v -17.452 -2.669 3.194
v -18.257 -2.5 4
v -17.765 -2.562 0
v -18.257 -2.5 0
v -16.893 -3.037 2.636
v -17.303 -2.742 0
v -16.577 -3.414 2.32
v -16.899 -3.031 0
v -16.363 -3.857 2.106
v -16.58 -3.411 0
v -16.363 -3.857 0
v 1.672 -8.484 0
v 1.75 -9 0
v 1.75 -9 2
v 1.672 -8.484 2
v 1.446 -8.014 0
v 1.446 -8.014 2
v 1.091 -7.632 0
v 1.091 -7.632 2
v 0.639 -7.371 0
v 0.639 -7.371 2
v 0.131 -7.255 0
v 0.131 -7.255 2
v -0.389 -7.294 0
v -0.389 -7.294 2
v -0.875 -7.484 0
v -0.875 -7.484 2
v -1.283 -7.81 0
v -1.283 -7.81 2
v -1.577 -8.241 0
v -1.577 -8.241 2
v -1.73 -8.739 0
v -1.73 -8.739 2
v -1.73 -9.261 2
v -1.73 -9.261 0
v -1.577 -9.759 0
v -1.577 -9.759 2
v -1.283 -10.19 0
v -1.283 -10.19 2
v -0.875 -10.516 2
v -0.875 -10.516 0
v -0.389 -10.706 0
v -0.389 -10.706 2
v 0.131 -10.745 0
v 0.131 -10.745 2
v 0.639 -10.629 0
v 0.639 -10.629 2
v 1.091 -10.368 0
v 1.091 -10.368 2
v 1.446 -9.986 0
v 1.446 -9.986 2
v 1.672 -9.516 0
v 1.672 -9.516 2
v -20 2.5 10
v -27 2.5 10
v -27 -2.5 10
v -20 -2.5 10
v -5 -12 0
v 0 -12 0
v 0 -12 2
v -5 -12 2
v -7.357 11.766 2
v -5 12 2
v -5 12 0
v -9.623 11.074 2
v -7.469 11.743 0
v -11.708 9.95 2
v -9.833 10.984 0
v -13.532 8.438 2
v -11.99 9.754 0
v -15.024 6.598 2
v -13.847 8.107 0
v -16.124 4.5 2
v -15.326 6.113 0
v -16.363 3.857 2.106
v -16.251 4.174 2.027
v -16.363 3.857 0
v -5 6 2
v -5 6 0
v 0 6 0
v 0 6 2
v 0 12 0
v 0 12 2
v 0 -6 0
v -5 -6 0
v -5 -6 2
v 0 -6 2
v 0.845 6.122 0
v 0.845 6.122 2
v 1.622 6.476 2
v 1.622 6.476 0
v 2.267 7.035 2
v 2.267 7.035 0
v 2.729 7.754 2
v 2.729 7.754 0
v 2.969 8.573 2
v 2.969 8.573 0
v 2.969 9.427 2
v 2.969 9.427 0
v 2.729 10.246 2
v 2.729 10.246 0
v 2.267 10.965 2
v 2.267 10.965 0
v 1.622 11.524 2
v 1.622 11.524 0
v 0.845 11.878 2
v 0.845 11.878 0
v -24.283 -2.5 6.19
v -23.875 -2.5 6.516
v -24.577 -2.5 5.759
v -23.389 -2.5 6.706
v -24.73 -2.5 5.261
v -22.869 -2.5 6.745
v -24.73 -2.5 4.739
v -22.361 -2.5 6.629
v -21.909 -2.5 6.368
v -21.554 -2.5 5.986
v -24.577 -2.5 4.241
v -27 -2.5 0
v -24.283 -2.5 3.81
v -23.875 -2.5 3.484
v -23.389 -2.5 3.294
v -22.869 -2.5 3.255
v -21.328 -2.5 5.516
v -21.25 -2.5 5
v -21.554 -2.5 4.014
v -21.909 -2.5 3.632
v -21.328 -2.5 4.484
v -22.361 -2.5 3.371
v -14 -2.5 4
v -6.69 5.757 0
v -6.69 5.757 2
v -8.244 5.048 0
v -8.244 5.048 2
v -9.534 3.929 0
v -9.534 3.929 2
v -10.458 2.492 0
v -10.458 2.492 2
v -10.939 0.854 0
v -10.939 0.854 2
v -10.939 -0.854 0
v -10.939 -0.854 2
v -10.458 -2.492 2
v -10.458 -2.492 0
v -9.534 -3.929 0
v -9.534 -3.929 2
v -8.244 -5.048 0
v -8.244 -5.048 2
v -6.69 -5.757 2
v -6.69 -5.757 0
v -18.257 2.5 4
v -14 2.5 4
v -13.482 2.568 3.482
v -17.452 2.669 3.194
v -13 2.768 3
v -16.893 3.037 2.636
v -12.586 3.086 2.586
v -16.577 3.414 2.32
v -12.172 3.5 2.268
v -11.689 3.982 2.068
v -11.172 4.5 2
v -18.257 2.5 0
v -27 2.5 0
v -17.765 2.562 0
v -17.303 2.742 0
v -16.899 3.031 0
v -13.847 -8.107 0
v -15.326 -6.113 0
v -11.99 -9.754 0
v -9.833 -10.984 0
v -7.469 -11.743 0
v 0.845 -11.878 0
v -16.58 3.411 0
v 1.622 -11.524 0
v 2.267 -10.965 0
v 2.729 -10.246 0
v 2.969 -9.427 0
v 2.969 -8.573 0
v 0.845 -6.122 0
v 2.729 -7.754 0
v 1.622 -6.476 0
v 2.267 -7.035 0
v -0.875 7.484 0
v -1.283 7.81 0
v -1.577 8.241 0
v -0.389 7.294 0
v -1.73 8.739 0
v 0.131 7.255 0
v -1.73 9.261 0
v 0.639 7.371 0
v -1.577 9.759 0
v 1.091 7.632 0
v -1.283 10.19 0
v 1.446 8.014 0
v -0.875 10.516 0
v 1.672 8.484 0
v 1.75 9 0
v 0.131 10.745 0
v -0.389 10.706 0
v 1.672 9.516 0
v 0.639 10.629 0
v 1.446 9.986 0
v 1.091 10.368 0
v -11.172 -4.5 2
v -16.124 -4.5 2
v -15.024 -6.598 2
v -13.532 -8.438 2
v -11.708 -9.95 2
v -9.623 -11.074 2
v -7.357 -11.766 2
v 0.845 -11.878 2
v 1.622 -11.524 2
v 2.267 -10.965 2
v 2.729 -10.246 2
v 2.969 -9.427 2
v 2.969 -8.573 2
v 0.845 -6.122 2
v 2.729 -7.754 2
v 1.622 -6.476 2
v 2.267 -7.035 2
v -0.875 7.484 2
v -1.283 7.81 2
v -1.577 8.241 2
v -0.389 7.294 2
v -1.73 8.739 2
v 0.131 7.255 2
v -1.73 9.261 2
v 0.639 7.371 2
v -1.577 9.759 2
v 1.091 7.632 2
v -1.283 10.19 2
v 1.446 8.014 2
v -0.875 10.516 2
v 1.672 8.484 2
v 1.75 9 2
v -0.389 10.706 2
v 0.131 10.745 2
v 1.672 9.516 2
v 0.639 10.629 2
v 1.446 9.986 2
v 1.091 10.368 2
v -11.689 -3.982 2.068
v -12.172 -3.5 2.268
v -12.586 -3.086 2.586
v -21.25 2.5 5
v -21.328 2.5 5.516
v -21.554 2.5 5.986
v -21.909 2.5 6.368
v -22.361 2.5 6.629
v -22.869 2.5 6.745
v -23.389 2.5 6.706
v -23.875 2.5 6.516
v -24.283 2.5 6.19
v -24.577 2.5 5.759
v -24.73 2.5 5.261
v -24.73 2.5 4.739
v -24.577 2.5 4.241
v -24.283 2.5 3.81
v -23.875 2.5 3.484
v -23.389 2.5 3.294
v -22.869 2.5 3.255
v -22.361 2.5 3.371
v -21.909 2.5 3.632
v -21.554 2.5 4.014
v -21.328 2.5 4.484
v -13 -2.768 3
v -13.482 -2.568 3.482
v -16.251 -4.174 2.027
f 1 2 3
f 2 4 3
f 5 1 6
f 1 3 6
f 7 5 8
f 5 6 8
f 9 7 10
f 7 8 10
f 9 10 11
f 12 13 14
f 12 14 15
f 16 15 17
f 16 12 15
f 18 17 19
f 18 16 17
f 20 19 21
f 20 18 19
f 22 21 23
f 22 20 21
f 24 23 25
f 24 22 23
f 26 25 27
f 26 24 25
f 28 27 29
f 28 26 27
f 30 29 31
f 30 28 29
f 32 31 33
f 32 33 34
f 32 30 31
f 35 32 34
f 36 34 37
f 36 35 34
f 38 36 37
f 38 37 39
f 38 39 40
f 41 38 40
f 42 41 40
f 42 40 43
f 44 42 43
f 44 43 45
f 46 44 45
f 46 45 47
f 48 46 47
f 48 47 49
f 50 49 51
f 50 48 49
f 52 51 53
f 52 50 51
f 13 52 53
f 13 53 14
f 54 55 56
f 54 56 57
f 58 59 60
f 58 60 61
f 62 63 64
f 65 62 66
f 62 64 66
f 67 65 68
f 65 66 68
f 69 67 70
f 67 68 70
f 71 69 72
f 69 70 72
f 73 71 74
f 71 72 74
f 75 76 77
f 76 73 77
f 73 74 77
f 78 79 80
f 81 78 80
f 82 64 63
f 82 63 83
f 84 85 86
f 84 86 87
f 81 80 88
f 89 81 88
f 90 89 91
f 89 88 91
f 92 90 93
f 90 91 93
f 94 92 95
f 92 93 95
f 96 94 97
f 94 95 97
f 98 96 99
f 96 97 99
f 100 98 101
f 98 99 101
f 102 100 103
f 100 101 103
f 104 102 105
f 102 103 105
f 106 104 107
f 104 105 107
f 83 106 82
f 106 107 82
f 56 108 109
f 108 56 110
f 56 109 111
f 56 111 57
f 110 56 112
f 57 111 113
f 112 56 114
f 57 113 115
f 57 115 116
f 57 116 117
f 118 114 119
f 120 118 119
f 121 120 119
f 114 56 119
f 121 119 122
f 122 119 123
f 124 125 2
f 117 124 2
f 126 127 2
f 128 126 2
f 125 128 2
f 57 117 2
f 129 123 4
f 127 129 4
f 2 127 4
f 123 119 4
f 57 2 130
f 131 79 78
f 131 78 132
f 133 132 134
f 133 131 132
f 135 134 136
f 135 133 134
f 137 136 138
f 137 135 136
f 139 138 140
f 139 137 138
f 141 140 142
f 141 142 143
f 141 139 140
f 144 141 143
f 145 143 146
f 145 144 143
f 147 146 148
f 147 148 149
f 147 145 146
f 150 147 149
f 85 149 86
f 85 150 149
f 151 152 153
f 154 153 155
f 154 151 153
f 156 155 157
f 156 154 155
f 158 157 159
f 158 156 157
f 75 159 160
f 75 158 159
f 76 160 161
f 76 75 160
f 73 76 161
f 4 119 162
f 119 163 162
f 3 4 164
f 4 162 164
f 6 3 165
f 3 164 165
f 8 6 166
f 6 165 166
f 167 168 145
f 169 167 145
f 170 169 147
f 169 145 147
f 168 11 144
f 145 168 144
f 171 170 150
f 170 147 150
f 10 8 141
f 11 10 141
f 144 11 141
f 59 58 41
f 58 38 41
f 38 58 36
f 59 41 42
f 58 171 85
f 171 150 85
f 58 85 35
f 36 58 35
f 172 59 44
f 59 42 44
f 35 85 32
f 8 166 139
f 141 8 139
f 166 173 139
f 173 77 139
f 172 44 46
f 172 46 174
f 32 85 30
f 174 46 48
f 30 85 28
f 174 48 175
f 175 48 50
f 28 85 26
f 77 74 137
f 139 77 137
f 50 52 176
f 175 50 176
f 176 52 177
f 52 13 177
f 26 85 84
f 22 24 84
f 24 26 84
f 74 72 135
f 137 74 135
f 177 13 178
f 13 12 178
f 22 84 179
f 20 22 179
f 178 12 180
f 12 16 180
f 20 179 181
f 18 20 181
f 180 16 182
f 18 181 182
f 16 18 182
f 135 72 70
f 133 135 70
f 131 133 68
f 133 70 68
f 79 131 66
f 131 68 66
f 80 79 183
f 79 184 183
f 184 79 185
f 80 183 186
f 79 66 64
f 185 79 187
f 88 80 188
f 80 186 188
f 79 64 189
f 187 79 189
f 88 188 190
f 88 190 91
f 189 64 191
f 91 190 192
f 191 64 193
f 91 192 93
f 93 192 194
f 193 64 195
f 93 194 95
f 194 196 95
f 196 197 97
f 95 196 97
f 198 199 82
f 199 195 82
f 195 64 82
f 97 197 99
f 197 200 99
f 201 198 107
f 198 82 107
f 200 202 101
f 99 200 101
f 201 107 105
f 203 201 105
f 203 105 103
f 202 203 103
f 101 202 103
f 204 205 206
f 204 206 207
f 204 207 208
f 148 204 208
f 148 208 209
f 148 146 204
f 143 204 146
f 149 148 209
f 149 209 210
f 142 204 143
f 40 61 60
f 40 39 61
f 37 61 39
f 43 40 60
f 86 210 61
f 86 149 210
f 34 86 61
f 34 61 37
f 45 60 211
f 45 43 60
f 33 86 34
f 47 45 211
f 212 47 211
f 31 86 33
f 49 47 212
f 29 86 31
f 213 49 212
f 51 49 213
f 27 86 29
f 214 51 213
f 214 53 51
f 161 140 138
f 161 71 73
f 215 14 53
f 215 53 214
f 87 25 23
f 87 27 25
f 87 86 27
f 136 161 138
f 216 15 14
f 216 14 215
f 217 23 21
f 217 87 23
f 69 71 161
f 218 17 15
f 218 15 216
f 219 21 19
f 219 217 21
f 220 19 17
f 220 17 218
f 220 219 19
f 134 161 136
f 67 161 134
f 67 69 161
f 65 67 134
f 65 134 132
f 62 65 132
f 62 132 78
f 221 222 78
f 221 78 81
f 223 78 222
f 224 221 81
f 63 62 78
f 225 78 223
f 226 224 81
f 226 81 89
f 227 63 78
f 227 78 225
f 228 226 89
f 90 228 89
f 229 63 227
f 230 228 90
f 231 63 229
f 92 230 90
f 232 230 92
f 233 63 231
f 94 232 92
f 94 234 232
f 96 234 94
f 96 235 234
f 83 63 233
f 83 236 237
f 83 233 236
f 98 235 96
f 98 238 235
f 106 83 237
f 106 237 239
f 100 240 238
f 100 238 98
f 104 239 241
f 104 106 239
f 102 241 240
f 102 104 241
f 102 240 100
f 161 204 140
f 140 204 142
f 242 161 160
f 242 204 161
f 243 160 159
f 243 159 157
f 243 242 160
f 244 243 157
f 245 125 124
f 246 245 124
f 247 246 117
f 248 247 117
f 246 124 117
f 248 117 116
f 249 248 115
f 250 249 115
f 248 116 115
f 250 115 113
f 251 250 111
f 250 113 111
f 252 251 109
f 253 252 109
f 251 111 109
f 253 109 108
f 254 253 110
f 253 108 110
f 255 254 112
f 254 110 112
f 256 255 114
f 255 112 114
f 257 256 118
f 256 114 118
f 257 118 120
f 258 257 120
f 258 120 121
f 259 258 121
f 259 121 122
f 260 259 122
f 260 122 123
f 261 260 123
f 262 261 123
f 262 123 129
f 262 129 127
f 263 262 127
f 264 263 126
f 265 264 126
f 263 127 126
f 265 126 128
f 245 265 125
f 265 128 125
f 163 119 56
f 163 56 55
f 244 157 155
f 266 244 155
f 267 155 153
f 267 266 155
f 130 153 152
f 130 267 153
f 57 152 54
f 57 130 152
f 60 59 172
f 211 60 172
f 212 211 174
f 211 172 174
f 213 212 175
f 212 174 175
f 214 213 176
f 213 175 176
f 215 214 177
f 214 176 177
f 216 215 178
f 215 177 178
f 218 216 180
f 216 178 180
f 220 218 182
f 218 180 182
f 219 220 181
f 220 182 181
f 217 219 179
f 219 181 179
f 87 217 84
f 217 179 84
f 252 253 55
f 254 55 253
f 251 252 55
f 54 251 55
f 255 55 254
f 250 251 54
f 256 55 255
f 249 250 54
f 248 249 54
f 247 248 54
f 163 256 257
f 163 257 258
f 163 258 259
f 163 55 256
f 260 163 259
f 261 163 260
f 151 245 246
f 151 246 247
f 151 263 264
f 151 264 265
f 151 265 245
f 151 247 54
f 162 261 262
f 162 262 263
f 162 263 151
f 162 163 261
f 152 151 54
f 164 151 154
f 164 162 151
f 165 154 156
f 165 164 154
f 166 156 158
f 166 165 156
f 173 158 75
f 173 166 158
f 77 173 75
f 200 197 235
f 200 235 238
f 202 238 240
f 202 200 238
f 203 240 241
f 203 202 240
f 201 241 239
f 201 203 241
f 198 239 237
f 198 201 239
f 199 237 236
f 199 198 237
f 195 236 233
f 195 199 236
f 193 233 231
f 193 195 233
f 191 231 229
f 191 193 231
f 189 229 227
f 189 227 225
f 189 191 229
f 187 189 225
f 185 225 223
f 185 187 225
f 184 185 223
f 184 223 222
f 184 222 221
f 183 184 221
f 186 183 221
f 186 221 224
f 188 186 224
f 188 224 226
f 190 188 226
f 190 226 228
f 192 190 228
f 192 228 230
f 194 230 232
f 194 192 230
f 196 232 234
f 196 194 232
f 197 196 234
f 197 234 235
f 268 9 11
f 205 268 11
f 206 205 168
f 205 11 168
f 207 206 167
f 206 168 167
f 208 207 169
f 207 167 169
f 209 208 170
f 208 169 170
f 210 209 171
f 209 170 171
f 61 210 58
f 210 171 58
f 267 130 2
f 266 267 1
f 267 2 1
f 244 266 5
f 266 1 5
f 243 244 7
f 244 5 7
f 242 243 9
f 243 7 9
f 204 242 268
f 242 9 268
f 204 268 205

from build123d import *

# Parameters (mm, degrees)
SKETCH009_R     = 1.75
PAD004_DEPTH    = 2
SKETCH010_W     = 15
SKETCH010_H     = 5
PAD005_DEPTH    = 10
POCKET005_DEPTH = 5
SKETCH012_R     = 1.75
POCKET006_DEPTH = 5
FILLET003_R     = 2


with BuildPart() as part:
    # Sketch009 → Pad004 (new body)
    with BuildSketch(Plane.XY):
        with BuildLine():
            ThreePointArc((0, -12), (3, -9), (0, -6))
            Line((-4.999996, -6), (0, -6))
            ThreePointArc((-5.000003, 6), (-11, -3e-06), (-4.999996, -6))
            Line((-5.000003, 6), (0, 6))
            ThreePointArc((0, 6), (3, 9), (0, 12))
            Line((-5.000044, 12), (0, 12))
            ThreePointArc((-5.000044, 12), (-17, -2.2e-05), (-5, -12))
            Line((0, -12), (-5, -12))
        make_face()
        with Locations((0, -9)):
            Circle(SKETCH009_R, mode=Mode.SUBTRACT)
        with Locations((0, 9)):
            Circle(SKETCH009_R, mode=Mode.SUBTRACT)
    extrude(amount=PAD004_DEPTH)

    # Sketch010 → Pad005 (join)
    with BuildSketch(Plane.XY):
        with Locations((-19.5, 0)):
            Rectangle(SKETCH010_W, SKETCH010_H)
    extrude(amount=PAD005_DEPTH)

    # Sketch011 (on Face16 of Pad005) → Pocket005 (cut)
    with BuildSketch(Plane.XZ.offset(2.5)):
        Polygon((-12, 2), (-20, 10), (-12, 10), align=None)
    extrude(amount=-POCKET005_DEPTH, mode=Mode.SUBTRACT)

    # Sketch012 (on Face17 of Pocket005) → Pocket006 (cut)
    with BuildSketch(Plane.XZ.offset(2.5)):
        with Locations((-23, 5)):
            Circle(SKETCH012_R)
    extrude(amount=-POCKET006_DEPTH, mode=Mode.SUBTRACT)

    # Fillet003
    fillet003_edges = [part.edges().sort_by_distance(p)[0] for p in [
        (-12, 0, 2),
        (-14.368347, 2.5, 2),
        (-14.368347, -2.5, 2),
        (-16.736695, -2.5, 1),
        (-16.736695, 2.5, 1),
    ]]
    fillet(fillet003_edges, radius=FILLET003_R)


solid = part.part
